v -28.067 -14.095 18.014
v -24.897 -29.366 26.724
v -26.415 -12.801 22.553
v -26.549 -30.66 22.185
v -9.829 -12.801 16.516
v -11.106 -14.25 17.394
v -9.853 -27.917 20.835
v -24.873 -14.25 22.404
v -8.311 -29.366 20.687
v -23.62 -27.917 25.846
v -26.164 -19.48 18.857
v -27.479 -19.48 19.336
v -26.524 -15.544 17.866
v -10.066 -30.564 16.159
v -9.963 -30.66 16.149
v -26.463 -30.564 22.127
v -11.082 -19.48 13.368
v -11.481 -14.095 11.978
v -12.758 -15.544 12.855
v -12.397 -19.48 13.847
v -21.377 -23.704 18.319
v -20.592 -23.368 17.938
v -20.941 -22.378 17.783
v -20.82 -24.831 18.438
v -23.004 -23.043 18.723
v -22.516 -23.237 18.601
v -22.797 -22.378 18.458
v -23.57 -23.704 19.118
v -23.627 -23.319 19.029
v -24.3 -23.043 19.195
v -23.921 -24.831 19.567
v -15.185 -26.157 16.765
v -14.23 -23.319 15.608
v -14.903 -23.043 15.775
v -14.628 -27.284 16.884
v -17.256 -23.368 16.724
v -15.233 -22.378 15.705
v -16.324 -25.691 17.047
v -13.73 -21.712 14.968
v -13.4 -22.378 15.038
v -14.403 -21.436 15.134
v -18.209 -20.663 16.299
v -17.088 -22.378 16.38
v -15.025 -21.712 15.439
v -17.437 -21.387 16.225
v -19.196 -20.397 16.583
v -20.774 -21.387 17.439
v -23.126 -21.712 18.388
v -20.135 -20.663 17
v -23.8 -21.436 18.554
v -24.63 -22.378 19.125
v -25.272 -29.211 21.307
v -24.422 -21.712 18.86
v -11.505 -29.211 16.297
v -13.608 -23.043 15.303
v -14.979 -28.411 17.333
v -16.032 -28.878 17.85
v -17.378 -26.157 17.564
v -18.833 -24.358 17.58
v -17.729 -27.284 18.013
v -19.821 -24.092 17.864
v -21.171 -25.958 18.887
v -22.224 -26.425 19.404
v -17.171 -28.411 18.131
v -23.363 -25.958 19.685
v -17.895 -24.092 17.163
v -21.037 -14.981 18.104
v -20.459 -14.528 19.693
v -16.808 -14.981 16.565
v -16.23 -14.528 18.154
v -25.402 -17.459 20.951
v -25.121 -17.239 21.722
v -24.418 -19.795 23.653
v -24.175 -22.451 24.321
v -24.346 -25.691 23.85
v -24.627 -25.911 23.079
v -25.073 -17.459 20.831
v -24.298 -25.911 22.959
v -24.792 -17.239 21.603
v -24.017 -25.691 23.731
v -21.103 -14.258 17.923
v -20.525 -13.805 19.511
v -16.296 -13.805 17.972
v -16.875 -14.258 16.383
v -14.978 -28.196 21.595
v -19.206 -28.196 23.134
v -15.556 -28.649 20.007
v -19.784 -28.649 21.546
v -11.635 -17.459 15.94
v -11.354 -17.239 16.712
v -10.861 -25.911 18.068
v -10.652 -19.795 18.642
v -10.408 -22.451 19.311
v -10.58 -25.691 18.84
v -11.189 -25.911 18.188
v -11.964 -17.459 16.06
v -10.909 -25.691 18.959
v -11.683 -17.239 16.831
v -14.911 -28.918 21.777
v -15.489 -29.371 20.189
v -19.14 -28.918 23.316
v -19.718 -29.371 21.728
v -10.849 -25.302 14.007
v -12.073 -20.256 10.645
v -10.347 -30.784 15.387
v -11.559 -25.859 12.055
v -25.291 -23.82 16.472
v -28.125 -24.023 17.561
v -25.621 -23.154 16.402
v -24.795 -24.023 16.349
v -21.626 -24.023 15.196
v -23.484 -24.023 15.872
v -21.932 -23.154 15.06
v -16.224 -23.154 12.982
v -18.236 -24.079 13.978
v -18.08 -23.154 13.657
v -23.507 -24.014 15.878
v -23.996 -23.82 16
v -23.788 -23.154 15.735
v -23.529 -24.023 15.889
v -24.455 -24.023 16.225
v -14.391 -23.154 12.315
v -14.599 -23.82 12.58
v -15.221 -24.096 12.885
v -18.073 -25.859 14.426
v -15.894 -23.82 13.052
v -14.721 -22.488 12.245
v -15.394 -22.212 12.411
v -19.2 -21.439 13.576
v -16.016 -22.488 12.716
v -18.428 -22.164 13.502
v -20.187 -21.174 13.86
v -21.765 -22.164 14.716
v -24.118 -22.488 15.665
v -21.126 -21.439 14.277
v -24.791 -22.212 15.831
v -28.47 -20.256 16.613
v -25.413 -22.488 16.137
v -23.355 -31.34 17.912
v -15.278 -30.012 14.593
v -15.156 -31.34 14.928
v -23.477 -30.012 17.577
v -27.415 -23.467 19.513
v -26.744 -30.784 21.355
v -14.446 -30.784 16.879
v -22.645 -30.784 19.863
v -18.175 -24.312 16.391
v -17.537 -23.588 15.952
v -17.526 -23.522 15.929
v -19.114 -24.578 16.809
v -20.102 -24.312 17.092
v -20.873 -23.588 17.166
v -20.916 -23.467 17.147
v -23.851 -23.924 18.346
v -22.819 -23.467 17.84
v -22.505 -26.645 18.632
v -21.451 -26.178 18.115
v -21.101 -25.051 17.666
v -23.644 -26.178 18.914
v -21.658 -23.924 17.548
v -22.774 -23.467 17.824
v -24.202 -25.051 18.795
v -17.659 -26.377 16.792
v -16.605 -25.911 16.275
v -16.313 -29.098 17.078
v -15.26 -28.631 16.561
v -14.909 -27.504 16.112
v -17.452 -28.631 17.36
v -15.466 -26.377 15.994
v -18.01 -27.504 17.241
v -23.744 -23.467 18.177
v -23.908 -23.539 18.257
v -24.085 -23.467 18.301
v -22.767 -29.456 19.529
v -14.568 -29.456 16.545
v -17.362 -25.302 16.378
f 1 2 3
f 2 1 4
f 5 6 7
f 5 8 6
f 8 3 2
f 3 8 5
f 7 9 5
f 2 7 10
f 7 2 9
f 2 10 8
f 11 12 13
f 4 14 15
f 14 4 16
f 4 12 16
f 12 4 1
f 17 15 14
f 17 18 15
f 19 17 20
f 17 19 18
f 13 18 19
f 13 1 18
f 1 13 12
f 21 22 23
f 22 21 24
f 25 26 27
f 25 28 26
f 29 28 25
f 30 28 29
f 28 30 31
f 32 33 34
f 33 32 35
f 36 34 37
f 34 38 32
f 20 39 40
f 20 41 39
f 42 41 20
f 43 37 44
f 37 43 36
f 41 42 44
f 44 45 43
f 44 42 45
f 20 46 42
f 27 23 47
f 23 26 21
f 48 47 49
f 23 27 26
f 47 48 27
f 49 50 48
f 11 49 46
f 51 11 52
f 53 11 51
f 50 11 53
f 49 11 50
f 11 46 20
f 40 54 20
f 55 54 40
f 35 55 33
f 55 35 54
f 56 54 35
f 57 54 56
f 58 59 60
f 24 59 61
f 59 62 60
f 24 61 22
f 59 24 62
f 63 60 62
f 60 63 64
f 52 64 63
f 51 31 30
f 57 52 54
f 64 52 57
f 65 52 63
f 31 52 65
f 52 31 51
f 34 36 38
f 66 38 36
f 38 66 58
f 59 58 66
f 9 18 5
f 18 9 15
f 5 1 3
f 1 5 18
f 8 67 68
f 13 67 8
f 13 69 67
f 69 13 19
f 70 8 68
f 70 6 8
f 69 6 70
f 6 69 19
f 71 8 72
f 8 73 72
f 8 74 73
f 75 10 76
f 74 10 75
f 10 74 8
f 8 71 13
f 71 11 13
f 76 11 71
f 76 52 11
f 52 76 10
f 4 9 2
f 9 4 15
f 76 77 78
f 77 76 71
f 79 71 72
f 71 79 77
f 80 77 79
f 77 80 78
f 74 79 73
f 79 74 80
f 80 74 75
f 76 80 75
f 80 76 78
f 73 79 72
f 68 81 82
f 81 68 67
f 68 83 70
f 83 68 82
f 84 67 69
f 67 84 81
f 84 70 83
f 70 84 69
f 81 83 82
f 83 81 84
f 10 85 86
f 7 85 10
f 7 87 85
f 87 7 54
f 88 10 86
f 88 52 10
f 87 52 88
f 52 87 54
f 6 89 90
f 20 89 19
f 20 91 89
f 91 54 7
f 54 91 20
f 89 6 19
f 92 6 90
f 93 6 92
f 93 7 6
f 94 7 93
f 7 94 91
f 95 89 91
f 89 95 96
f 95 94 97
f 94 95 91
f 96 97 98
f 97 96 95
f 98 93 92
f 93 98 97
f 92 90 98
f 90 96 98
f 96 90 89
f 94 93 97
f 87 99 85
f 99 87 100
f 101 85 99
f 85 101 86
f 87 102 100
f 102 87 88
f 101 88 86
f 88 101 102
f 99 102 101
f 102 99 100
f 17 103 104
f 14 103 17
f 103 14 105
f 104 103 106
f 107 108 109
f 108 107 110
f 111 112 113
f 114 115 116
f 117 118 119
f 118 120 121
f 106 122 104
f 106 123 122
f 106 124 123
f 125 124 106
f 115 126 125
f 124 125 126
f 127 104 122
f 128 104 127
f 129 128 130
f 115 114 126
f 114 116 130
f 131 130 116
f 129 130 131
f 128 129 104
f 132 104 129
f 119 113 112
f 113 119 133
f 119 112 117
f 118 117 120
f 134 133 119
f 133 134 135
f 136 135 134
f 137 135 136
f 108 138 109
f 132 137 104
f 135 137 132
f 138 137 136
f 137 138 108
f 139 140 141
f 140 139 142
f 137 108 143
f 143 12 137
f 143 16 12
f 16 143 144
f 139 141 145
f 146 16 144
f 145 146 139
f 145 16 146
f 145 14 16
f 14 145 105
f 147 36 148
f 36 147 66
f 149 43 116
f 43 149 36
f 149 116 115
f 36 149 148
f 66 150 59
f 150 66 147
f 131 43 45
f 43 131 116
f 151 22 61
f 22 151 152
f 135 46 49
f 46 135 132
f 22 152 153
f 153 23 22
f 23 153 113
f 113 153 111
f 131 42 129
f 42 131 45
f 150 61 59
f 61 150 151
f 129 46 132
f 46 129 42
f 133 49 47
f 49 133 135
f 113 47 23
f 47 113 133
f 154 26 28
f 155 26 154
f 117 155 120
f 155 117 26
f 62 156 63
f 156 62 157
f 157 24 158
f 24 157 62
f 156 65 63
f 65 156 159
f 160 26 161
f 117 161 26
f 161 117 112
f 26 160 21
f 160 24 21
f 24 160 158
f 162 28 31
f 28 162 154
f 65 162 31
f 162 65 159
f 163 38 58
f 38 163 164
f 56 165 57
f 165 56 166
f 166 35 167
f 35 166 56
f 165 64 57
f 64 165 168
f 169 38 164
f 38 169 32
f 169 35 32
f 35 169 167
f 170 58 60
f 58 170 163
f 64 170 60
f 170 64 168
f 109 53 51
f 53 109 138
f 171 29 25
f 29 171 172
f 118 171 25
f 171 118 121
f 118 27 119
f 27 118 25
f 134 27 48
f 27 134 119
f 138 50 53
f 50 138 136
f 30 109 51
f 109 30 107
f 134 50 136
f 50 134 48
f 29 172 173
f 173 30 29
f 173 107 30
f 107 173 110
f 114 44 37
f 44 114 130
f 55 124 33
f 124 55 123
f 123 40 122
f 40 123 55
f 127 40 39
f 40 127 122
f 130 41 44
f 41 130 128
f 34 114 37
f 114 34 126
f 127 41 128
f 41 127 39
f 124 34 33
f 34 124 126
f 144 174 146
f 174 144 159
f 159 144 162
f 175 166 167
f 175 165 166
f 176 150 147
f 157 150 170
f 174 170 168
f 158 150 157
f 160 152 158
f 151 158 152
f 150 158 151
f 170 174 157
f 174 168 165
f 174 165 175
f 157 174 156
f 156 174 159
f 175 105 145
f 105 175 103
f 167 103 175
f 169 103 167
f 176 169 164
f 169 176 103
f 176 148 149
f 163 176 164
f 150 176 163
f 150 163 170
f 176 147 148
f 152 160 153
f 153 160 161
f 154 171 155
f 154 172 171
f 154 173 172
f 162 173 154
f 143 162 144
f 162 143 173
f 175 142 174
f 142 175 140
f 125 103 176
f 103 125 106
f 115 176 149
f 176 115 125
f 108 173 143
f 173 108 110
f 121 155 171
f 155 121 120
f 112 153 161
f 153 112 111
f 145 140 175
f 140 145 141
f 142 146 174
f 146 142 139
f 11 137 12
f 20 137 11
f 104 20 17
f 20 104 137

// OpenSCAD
difference () {
  union () {
    translate ([0, 0, 8]) {
      rotate (a=14.999999999999998, v=[0, 1, 0]) {
        translate ([0, 0, 0]) {
          translate ([0, 0, 240.6513202133688]) {
            rotate (a=5.0, v=[0, 1, 0]) {
              translate ([0, 0, -240.6513202133688]) {
                translate ([0, 0, 86.460145740475]) {
                  rotate (a=-14.999999999999998, v=[1, 0, 0]) {
                    translate ([0, 0, -86.460145740475]) {
                      mirror ([1, 0, 0]) {
                        difference () {
                          union () {
                            difference () {
                              union () {
                                translate ([0, 7.825, 5/2]) {
                                  cube ([17.65, 1.5, 5], center=true);
                                }
                                translate ([8.075, 0, 5/2]) {
                                  cube ([1.5, 17.15, 5], center=true);
                                }
                                hull () {
                                  translate ([8.075, 0, 4.347826086956522]) {
                                    cube ([1.5, 2.75, 1], center=true);
                                  }
                                  translate ([7.325, 0, 3.1]) {
                                    rotate (a=90.0, v=[1, 0, 0]) {
                                      cube ([0.7, 0.85, 8.75], center=true);
                                    }
                                  }
                                }
                              }
                              translate ([0, 7.4481343283582095, 3.05]) {
                                cube ([4.5, 0.75, 1.75], center=true);
                              }
                            }
                            mirror ([0, 1, 0]) {
                              mirror ([1, 0, 0]) {
                                difference () {
                                  union () {
                                    translate ([0, 7.825, 5/2]) {
                                      cube ([17.65, 1.5, 5], center=true);
                                    }
                                    translate ([8.075, 0, 5/2]) {
                                      cube ([1.5, 17.15, 5], center=true);
                                    }
                                    hull () {
                                      translate ([8.075, 0, 4.347826086956522]) {
                                        cube ([1.5, 2.75, 1], center=true);
                                      }
                                      translate ([7.325, 0, 3.1]) {
                                        rotate (a=90.0, v=[1, 0, 0]) {
                                          cube ([0.7, 0.85, 8.75], center=true);
                                        }
                                      }
                                    }
                                  }
                                  translate ([0, 7.4481343283582095, 3.05]) {
                                    cube ([4.5, 0.75, 1.75], center=true);
                                  }
                                }
                              }
                            }
                            mirror ([0, 1, 0]) {
                              mirror ([1, 0, 0]) {
                                difference () {
                                  translate ([0, 0.0, -3/2]) {
                                    cube ([17.45, 16.95, 3], center=true);
                                  }
                                  cylinder ($fn=12, h=10, r=2.05, center=true);
                                  translate ([-3.81, 2.54, 0]) {
                                    cylinder ($fn=8, h=10, r=1.65, center=true);
                                  }
                                  translate ([2.54, 5.08, 0]) {
                                    cylinder ($fn=8, h=10, r=1.65, center=true);
                                  }
                                  translate ([-5, 0, 0]) {
                                    cylinder ($fn=8, h=10, r=0.975, center=true);
                                  }
                                  translate ([5, 0, 0]) {
                                    cylinder ($fn=8, h=10, r=0.975, center=true);
                                  }
                                  translate ([0.01, 4.95, -2.6]) {
                                    cube ([17.45, 4.3, 3.5], center=true);
                                  }
                                  translate ([-3.8777777777777778, 4, -2.6]) {
                                    cube ([11.3425, 6.2, 3.5], center=true);
                                  }
                                  translate ([6.543749999999999, 8.475, -2.6]) {
                                    cube ([4.3625, 4.3, 3.5], center=true);
                                  }
                                  translate ([-6.543749999999999, 8.475, -2.6]) {
                                    cube ([4.3625, 4.3, 3.5], center=true);
                                  }
                                  translate ([0, -6, -2.6]) {
                                    cube ([17.45, 6, 10], center=true);
                                  }
                                }
                              }
                            }
                          }
                        }
                      }
                    }
                  }
                }
              }
            }
          }
        }
      }
    }
  }
  translate ([0, 0, -20]) {
    cube ([350, 350, 40], center=true);
  }
}
